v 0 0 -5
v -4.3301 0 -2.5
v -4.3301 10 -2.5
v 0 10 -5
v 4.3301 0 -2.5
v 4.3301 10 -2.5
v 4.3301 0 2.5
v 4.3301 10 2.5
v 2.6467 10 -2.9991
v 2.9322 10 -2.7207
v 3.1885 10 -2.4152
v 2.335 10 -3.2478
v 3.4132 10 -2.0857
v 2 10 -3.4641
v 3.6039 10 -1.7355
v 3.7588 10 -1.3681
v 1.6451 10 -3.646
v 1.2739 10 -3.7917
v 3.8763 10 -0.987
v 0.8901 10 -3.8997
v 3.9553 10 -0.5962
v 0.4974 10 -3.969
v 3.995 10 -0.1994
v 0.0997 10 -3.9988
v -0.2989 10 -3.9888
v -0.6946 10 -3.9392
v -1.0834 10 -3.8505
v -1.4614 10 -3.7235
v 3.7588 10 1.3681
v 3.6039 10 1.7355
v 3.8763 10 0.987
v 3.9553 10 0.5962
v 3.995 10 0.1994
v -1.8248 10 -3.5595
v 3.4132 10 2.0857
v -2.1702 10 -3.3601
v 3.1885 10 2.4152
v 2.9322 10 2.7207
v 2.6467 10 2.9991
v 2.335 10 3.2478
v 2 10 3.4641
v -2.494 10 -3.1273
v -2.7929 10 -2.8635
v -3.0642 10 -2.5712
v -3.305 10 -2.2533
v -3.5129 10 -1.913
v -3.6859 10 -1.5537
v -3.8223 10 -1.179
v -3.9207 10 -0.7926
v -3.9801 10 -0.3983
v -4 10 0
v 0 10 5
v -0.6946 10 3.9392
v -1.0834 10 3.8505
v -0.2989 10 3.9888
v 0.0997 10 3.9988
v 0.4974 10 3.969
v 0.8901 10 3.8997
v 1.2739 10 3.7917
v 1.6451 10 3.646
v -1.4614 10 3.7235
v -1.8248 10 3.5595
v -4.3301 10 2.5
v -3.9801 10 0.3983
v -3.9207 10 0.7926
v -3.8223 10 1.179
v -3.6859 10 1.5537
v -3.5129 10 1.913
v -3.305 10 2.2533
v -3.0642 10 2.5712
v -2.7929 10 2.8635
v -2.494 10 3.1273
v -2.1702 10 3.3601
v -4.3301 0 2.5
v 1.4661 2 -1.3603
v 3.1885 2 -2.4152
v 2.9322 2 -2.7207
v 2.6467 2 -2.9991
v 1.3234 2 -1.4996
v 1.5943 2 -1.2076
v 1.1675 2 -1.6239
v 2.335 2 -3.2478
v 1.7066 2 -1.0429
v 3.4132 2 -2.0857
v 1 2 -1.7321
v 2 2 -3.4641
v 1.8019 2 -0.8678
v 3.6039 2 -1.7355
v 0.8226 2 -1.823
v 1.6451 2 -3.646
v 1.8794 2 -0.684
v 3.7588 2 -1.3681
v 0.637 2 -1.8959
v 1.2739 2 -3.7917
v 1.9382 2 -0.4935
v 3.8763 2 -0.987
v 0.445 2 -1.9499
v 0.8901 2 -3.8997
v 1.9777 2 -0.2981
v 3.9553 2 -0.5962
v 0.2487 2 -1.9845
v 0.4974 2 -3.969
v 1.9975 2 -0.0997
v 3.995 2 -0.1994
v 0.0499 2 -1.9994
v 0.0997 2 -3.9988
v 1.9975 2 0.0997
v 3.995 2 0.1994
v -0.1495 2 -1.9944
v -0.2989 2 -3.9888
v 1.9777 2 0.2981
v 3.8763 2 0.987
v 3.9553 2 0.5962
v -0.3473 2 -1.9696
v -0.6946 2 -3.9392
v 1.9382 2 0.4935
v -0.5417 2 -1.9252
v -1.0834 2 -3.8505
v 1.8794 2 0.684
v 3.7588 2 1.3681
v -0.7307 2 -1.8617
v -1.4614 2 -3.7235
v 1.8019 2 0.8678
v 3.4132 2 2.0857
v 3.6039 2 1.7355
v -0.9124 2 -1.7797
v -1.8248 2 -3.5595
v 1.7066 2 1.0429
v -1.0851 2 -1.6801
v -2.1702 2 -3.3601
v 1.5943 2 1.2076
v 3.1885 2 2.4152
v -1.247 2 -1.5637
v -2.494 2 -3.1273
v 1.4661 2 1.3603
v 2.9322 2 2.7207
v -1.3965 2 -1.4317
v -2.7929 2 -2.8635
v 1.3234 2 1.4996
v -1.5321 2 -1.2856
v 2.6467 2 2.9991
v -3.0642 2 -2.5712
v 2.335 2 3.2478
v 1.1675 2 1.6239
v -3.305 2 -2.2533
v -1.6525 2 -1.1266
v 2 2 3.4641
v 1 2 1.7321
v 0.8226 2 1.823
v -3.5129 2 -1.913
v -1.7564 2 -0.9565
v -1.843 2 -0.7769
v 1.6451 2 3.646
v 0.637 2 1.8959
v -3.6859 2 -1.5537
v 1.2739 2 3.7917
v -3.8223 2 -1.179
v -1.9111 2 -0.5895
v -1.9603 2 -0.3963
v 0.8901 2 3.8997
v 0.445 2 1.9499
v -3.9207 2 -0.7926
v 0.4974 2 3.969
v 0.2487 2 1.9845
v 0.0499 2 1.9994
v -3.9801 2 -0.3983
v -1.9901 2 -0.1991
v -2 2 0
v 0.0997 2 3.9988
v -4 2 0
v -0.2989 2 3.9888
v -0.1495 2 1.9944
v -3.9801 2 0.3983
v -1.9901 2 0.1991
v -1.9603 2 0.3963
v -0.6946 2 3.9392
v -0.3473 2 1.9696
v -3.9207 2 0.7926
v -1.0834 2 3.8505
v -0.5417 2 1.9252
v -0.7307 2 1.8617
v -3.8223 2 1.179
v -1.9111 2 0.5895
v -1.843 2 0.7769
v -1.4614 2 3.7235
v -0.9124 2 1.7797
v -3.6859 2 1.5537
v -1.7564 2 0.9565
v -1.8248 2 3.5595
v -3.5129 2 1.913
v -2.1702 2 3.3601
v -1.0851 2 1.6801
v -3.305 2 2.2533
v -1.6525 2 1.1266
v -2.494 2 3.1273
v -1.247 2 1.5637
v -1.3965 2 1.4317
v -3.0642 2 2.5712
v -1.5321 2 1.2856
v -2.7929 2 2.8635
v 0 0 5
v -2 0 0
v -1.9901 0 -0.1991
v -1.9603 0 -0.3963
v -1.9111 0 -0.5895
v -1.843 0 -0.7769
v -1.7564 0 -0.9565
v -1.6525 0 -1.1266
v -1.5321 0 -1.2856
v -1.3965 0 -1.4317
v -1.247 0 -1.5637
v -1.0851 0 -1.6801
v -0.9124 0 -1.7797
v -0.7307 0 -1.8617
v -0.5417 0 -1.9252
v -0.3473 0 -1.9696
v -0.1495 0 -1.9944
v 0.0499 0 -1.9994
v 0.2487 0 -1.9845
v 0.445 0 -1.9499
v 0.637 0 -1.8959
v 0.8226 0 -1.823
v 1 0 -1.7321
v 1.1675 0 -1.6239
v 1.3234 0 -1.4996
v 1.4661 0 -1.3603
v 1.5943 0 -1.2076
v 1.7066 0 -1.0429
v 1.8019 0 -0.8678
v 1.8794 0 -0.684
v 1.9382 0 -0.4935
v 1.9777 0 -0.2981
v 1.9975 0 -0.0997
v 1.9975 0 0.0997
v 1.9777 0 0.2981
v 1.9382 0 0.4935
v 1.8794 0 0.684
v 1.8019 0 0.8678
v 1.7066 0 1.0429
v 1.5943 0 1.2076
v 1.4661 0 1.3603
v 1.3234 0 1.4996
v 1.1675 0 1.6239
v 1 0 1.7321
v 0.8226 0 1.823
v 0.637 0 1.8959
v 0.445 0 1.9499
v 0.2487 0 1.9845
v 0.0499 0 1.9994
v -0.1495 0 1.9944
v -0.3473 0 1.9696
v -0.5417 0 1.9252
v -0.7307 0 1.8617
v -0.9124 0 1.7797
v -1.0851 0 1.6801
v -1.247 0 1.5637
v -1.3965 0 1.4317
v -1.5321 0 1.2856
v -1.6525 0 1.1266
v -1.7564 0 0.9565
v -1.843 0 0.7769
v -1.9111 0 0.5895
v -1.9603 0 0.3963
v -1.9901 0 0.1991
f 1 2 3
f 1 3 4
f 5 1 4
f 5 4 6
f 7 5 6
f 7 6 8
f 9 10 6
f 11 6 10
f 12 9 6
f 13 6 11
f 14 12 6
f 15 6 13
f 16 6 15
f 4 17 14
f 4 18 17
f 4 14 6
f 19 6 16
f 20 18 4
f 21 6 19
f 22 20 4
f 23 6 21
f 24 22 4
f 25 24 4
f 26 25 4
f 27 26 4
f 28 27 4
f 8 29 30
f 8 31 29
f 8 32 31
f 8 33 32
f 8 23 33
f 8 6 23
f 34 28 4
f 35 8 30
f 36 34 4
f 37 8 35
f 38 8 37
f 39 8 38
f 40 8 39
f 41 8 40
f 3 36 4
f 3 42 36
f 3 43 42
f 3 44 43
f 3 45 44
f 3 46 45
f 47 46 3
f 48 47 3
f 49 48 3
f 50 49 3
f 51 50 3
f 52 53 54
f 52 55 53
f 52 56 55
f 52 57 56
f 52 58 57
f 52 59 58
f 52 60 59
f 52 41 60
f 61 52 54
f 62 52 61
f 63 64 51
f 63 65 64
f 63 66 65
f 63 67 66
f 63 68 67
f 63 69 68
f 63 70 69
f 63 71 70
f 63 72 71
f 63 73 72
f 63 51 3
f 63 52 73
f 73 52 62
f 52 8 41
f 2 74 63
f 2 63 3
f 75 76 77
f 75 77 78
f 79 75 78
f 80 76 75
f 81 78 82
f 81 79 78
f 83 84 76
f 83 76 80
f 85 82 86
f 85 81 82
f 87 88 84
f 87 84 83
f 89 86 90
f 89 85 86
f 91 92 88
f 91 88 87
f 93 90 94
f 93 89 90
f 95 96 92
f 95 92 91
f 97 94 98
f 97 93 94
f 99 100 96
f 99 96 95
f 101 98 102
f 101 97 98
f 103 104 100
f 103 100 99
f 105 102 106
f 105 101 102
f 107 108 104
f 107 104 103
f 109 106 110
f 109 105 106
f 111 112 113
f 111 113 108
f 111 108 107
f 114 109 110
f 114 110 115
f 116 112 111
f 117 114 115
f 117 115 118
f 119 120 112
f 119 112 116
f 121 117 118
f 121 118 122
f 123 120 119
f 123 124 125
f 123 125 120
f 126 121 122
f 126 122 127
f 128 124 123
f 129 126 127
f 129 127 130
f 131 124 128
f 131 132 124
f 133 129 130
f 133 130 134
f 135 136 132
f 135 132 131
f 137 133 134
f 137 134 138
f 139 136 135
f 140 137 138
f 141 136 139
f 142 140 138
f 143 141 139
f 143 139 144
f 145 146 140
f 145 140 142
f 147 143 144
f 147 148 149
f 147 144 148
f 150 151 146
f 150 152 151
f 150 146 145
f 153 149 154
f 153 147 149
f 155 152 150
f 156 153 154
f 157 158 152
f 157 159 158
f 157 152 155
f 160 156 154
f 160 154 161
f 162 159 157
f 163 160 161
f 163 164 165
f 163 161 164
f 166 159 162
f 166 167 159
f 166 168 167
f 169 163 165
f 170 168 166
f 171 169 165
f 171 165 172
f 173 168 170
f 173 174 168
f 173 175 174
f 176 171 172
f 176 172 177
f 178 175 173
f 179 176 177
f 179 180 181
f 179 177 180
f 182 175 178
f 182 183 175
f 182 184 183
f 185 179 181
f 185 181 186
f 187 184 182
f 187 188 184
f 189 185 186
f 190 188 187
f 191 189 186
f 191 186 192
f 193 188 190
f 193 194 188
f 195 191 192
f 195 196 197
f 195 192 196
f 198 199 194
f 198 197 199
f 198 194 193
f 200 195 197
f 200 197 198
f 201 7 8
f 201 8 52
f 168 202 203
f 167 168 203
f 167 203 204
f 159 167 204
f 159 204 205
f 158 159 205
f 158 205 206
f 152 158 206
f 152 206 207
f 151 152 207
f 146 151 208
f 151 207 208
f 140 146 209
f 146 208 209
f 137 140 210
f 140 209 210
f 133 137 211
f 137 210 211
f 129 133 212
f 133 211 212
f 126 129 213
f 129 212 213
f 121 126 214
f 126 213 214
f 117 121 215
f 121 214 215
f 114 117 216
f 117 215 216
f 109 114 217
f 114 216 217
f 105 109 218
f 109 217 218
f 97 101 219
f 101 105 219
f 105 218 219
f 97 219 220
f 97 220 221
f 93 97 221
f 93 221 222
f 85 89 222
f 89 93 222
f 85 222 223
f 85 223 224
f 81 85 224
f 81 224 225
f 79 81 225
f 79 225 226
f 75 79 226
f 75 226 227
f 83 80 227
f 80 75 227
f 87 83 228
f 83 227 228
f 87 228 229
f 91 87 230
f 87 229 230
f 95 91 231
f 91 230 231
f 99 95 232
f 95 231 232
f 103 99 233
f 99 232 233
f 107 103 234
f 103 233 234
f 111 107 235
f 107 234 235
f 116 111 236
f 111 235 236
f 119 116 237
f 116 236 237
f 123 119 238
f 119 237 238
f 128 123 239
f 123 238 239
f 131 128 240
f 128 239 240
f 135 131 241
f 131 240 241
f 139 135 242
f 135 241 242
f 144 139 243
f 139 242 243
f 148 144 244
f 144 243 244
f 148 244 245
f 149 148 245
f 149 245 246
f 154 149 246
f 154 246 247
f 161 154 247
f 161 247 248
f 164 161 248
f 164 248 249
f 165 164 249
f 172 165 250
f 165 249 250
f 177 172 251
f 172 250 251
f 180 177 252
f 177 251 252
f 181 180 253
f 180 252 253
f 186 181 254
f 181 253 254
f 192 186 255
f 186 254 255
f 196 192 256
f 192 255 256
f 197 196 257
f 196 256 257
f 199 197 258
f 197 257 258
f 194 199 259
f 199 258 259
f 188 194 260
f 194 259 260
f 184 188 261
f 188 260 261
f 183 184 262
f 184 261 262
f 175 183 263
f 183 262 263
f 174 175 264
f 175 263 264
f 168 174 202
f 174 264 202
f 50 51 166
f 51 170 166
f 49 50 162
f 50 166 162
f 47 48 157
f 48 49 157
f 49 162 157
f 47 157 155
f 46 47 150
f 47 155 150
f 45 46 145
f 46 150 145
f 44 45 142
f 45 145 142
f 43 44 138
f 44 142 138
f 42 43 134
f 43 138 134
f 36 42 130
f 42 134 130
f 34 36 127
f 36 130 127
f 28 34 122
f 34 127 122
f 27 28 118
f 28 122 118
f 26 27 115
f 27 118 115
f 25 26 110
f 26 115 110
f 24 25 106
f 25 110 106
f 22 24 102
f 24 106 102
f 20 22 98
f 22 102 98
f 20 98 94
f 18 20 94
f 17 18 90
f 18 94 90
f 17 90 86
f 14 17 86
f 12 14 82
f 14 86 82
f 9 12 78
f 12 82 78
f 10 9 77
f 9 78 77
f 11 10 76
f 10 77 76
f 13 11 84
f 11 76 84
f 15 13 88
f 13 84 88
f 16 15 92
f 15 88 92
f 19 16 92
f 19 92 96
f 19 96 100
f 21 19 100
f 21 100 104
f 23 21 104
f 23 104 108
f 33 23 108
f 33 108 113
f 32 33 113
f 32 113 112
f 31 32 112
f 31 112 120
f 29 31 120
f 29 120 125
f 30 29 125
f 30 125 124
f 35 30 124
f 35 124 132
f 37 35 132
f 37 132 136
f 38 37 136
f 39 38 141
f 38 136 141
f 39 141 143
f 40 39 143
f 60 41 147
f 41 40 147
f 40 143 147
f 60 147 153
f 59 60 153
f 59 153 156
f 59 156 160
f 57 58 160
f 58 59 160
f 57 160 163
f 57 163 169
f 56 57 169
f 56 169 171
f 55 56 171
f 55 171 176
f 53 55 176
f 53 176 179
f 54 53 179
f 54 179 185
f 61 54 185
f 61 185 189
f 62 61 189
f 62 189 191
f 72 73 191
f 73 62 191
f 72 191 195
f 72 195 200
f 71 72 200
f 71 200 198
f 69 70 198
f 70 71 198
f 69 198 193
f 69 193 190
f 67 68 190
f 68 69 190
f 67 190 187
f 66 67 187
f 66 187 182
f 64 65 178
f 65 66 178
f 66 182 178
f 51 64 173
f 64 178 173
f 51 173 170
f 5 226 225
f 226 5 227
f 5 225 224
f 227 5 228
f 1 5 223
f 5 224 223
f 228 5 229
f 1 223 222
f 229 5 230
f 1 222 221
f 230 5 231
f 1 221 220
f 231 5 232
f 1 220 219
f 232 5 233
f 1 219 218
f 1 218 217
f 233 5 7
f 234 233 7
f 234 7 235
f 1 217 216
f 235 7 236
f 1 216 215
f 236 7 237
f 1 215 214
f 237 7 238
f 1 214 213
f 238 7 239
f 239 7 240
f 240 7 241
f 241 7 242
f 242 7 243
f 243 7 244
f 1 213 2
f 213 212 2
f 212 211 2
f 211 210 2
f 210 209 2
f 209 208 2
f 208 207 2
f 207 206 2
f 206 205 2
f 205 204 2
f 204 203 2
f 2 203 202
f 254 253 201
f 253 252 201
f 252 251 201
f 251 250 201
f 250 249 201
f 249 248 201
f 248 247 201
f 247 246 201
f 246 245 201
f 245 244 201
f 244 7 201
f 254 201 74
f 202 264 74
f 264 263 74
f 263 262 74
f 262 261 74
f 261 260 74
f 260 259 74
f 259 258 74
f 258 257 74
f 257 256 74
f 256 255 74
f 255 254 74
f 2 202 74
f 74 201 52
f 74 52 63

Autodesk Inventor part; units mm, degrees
ref_plane "YZ Plane" through (0, 0, 0) normal (1, 0, 0) x (0, 1, 0)
ref_plane "XZ Plane" through (0, 0, 0) normal (0, 1, 0) x (-1, 0, 0)
ref_plane "XY Plane" through (0, 0, 0) normal (0, 0, 1) x (1, 0, 0)
sketch "Boceto1" plane through (0, 0, 0) normal (0, 1, 0) x (-1, 0, 0)
  line L0 (0, 5) -> (4.3301, 2.5)
  line L1 (4.3301, 2.5) -> (4.3301, -2.5)
  line L2 (4.3301, -2.5) -> (0, -5)
  line L3 (0, -5) -> (-4.3301, -2.5)
  line L4 (-4.3301, -2.5) -> (-4.3301, 2.5)
  line L5 (-4.3301, 2.5) -> (0, 5)
  circle A0 centre (0, 0) radius 4
  circle A1 centre (0, 0) radius 2
  dimension "d0" = 10
  dimension "d1" = 8
  dimension "d2" = 4
extrude "Extrusión1" add sketch "Boceto1" along normal blind 10 contours L0 L1 L2 L3 L4 L5
extrude "Extrusión2" add sketch "Boceto1" along normal blind 2 contours A0
thread "Rosca1" size "M8x0.75" class "6H" standard "ANSI Metric M Profile" length 6
properties part number "Pieza 1 subensamble 1-69" material "Latón, amarillo claro"
